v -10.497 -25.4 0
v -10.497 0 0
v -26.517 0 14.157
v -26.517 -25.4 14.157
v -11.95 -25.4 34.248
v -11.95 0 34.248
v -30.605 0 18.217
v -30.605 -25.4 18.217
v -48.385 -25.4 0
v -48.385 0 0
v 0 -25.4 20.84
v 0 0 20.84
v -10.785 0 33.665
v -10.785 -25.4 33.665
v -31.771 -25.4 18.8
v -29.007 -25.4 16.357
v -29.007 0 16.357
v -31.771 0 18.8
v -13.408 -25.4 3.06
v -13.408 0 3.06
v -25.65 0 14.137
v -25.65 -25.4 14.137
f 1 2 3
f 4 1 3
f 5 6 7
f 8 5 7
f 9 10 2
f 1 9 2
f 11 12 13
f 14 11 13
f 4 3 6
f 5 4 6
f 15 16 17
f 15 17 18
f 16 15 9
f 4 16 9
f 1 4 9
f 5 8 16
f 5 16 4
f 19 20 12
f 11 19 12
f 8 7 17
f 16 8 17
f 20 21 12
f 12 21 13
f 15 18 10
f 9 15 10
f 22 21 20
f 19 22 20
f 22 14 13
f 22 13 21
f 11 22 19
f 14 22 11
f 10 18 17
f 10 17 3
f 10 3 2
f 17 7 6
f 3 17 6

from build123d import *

# Parameters (mm, degrees)
F1_DEPTH = 25.4
F3_DEPTH = 25.4
F5_DEPTH = 25.4


with BuildPart() as f1:
    # F0 (on Front) → F1 (new body)
    with BuildSketch(Plane.XZ):
        Polygon((-31.770822, 18.800164), (-48.38492, 0), (-10.496952, 0), align=None)
    extrude(amount=F1_DEPTH)

    # F4 (on Front) → F5 (join)
    with BuildSketch(Plane.XZ):
        Polygon((-26.791301, 13.77955), (-11.950492, 34.24836), (-30.604918, 18.217213), align=None)
    extrude(amount=F5_DEPTH)


with BuildPart() as f3:
    # F2 (on Front) → F3 (new body)
    with BuildSketch(Plane.XZ):
        Polygon((-10.784591, 33.665407), (-25.649836, 14.136557), (-13.407868, 3.060492), (0, 20.840492), align=None)
    extrude(amount=F3_DEPTH)


solid = Compound([f1.part, f3.part])
